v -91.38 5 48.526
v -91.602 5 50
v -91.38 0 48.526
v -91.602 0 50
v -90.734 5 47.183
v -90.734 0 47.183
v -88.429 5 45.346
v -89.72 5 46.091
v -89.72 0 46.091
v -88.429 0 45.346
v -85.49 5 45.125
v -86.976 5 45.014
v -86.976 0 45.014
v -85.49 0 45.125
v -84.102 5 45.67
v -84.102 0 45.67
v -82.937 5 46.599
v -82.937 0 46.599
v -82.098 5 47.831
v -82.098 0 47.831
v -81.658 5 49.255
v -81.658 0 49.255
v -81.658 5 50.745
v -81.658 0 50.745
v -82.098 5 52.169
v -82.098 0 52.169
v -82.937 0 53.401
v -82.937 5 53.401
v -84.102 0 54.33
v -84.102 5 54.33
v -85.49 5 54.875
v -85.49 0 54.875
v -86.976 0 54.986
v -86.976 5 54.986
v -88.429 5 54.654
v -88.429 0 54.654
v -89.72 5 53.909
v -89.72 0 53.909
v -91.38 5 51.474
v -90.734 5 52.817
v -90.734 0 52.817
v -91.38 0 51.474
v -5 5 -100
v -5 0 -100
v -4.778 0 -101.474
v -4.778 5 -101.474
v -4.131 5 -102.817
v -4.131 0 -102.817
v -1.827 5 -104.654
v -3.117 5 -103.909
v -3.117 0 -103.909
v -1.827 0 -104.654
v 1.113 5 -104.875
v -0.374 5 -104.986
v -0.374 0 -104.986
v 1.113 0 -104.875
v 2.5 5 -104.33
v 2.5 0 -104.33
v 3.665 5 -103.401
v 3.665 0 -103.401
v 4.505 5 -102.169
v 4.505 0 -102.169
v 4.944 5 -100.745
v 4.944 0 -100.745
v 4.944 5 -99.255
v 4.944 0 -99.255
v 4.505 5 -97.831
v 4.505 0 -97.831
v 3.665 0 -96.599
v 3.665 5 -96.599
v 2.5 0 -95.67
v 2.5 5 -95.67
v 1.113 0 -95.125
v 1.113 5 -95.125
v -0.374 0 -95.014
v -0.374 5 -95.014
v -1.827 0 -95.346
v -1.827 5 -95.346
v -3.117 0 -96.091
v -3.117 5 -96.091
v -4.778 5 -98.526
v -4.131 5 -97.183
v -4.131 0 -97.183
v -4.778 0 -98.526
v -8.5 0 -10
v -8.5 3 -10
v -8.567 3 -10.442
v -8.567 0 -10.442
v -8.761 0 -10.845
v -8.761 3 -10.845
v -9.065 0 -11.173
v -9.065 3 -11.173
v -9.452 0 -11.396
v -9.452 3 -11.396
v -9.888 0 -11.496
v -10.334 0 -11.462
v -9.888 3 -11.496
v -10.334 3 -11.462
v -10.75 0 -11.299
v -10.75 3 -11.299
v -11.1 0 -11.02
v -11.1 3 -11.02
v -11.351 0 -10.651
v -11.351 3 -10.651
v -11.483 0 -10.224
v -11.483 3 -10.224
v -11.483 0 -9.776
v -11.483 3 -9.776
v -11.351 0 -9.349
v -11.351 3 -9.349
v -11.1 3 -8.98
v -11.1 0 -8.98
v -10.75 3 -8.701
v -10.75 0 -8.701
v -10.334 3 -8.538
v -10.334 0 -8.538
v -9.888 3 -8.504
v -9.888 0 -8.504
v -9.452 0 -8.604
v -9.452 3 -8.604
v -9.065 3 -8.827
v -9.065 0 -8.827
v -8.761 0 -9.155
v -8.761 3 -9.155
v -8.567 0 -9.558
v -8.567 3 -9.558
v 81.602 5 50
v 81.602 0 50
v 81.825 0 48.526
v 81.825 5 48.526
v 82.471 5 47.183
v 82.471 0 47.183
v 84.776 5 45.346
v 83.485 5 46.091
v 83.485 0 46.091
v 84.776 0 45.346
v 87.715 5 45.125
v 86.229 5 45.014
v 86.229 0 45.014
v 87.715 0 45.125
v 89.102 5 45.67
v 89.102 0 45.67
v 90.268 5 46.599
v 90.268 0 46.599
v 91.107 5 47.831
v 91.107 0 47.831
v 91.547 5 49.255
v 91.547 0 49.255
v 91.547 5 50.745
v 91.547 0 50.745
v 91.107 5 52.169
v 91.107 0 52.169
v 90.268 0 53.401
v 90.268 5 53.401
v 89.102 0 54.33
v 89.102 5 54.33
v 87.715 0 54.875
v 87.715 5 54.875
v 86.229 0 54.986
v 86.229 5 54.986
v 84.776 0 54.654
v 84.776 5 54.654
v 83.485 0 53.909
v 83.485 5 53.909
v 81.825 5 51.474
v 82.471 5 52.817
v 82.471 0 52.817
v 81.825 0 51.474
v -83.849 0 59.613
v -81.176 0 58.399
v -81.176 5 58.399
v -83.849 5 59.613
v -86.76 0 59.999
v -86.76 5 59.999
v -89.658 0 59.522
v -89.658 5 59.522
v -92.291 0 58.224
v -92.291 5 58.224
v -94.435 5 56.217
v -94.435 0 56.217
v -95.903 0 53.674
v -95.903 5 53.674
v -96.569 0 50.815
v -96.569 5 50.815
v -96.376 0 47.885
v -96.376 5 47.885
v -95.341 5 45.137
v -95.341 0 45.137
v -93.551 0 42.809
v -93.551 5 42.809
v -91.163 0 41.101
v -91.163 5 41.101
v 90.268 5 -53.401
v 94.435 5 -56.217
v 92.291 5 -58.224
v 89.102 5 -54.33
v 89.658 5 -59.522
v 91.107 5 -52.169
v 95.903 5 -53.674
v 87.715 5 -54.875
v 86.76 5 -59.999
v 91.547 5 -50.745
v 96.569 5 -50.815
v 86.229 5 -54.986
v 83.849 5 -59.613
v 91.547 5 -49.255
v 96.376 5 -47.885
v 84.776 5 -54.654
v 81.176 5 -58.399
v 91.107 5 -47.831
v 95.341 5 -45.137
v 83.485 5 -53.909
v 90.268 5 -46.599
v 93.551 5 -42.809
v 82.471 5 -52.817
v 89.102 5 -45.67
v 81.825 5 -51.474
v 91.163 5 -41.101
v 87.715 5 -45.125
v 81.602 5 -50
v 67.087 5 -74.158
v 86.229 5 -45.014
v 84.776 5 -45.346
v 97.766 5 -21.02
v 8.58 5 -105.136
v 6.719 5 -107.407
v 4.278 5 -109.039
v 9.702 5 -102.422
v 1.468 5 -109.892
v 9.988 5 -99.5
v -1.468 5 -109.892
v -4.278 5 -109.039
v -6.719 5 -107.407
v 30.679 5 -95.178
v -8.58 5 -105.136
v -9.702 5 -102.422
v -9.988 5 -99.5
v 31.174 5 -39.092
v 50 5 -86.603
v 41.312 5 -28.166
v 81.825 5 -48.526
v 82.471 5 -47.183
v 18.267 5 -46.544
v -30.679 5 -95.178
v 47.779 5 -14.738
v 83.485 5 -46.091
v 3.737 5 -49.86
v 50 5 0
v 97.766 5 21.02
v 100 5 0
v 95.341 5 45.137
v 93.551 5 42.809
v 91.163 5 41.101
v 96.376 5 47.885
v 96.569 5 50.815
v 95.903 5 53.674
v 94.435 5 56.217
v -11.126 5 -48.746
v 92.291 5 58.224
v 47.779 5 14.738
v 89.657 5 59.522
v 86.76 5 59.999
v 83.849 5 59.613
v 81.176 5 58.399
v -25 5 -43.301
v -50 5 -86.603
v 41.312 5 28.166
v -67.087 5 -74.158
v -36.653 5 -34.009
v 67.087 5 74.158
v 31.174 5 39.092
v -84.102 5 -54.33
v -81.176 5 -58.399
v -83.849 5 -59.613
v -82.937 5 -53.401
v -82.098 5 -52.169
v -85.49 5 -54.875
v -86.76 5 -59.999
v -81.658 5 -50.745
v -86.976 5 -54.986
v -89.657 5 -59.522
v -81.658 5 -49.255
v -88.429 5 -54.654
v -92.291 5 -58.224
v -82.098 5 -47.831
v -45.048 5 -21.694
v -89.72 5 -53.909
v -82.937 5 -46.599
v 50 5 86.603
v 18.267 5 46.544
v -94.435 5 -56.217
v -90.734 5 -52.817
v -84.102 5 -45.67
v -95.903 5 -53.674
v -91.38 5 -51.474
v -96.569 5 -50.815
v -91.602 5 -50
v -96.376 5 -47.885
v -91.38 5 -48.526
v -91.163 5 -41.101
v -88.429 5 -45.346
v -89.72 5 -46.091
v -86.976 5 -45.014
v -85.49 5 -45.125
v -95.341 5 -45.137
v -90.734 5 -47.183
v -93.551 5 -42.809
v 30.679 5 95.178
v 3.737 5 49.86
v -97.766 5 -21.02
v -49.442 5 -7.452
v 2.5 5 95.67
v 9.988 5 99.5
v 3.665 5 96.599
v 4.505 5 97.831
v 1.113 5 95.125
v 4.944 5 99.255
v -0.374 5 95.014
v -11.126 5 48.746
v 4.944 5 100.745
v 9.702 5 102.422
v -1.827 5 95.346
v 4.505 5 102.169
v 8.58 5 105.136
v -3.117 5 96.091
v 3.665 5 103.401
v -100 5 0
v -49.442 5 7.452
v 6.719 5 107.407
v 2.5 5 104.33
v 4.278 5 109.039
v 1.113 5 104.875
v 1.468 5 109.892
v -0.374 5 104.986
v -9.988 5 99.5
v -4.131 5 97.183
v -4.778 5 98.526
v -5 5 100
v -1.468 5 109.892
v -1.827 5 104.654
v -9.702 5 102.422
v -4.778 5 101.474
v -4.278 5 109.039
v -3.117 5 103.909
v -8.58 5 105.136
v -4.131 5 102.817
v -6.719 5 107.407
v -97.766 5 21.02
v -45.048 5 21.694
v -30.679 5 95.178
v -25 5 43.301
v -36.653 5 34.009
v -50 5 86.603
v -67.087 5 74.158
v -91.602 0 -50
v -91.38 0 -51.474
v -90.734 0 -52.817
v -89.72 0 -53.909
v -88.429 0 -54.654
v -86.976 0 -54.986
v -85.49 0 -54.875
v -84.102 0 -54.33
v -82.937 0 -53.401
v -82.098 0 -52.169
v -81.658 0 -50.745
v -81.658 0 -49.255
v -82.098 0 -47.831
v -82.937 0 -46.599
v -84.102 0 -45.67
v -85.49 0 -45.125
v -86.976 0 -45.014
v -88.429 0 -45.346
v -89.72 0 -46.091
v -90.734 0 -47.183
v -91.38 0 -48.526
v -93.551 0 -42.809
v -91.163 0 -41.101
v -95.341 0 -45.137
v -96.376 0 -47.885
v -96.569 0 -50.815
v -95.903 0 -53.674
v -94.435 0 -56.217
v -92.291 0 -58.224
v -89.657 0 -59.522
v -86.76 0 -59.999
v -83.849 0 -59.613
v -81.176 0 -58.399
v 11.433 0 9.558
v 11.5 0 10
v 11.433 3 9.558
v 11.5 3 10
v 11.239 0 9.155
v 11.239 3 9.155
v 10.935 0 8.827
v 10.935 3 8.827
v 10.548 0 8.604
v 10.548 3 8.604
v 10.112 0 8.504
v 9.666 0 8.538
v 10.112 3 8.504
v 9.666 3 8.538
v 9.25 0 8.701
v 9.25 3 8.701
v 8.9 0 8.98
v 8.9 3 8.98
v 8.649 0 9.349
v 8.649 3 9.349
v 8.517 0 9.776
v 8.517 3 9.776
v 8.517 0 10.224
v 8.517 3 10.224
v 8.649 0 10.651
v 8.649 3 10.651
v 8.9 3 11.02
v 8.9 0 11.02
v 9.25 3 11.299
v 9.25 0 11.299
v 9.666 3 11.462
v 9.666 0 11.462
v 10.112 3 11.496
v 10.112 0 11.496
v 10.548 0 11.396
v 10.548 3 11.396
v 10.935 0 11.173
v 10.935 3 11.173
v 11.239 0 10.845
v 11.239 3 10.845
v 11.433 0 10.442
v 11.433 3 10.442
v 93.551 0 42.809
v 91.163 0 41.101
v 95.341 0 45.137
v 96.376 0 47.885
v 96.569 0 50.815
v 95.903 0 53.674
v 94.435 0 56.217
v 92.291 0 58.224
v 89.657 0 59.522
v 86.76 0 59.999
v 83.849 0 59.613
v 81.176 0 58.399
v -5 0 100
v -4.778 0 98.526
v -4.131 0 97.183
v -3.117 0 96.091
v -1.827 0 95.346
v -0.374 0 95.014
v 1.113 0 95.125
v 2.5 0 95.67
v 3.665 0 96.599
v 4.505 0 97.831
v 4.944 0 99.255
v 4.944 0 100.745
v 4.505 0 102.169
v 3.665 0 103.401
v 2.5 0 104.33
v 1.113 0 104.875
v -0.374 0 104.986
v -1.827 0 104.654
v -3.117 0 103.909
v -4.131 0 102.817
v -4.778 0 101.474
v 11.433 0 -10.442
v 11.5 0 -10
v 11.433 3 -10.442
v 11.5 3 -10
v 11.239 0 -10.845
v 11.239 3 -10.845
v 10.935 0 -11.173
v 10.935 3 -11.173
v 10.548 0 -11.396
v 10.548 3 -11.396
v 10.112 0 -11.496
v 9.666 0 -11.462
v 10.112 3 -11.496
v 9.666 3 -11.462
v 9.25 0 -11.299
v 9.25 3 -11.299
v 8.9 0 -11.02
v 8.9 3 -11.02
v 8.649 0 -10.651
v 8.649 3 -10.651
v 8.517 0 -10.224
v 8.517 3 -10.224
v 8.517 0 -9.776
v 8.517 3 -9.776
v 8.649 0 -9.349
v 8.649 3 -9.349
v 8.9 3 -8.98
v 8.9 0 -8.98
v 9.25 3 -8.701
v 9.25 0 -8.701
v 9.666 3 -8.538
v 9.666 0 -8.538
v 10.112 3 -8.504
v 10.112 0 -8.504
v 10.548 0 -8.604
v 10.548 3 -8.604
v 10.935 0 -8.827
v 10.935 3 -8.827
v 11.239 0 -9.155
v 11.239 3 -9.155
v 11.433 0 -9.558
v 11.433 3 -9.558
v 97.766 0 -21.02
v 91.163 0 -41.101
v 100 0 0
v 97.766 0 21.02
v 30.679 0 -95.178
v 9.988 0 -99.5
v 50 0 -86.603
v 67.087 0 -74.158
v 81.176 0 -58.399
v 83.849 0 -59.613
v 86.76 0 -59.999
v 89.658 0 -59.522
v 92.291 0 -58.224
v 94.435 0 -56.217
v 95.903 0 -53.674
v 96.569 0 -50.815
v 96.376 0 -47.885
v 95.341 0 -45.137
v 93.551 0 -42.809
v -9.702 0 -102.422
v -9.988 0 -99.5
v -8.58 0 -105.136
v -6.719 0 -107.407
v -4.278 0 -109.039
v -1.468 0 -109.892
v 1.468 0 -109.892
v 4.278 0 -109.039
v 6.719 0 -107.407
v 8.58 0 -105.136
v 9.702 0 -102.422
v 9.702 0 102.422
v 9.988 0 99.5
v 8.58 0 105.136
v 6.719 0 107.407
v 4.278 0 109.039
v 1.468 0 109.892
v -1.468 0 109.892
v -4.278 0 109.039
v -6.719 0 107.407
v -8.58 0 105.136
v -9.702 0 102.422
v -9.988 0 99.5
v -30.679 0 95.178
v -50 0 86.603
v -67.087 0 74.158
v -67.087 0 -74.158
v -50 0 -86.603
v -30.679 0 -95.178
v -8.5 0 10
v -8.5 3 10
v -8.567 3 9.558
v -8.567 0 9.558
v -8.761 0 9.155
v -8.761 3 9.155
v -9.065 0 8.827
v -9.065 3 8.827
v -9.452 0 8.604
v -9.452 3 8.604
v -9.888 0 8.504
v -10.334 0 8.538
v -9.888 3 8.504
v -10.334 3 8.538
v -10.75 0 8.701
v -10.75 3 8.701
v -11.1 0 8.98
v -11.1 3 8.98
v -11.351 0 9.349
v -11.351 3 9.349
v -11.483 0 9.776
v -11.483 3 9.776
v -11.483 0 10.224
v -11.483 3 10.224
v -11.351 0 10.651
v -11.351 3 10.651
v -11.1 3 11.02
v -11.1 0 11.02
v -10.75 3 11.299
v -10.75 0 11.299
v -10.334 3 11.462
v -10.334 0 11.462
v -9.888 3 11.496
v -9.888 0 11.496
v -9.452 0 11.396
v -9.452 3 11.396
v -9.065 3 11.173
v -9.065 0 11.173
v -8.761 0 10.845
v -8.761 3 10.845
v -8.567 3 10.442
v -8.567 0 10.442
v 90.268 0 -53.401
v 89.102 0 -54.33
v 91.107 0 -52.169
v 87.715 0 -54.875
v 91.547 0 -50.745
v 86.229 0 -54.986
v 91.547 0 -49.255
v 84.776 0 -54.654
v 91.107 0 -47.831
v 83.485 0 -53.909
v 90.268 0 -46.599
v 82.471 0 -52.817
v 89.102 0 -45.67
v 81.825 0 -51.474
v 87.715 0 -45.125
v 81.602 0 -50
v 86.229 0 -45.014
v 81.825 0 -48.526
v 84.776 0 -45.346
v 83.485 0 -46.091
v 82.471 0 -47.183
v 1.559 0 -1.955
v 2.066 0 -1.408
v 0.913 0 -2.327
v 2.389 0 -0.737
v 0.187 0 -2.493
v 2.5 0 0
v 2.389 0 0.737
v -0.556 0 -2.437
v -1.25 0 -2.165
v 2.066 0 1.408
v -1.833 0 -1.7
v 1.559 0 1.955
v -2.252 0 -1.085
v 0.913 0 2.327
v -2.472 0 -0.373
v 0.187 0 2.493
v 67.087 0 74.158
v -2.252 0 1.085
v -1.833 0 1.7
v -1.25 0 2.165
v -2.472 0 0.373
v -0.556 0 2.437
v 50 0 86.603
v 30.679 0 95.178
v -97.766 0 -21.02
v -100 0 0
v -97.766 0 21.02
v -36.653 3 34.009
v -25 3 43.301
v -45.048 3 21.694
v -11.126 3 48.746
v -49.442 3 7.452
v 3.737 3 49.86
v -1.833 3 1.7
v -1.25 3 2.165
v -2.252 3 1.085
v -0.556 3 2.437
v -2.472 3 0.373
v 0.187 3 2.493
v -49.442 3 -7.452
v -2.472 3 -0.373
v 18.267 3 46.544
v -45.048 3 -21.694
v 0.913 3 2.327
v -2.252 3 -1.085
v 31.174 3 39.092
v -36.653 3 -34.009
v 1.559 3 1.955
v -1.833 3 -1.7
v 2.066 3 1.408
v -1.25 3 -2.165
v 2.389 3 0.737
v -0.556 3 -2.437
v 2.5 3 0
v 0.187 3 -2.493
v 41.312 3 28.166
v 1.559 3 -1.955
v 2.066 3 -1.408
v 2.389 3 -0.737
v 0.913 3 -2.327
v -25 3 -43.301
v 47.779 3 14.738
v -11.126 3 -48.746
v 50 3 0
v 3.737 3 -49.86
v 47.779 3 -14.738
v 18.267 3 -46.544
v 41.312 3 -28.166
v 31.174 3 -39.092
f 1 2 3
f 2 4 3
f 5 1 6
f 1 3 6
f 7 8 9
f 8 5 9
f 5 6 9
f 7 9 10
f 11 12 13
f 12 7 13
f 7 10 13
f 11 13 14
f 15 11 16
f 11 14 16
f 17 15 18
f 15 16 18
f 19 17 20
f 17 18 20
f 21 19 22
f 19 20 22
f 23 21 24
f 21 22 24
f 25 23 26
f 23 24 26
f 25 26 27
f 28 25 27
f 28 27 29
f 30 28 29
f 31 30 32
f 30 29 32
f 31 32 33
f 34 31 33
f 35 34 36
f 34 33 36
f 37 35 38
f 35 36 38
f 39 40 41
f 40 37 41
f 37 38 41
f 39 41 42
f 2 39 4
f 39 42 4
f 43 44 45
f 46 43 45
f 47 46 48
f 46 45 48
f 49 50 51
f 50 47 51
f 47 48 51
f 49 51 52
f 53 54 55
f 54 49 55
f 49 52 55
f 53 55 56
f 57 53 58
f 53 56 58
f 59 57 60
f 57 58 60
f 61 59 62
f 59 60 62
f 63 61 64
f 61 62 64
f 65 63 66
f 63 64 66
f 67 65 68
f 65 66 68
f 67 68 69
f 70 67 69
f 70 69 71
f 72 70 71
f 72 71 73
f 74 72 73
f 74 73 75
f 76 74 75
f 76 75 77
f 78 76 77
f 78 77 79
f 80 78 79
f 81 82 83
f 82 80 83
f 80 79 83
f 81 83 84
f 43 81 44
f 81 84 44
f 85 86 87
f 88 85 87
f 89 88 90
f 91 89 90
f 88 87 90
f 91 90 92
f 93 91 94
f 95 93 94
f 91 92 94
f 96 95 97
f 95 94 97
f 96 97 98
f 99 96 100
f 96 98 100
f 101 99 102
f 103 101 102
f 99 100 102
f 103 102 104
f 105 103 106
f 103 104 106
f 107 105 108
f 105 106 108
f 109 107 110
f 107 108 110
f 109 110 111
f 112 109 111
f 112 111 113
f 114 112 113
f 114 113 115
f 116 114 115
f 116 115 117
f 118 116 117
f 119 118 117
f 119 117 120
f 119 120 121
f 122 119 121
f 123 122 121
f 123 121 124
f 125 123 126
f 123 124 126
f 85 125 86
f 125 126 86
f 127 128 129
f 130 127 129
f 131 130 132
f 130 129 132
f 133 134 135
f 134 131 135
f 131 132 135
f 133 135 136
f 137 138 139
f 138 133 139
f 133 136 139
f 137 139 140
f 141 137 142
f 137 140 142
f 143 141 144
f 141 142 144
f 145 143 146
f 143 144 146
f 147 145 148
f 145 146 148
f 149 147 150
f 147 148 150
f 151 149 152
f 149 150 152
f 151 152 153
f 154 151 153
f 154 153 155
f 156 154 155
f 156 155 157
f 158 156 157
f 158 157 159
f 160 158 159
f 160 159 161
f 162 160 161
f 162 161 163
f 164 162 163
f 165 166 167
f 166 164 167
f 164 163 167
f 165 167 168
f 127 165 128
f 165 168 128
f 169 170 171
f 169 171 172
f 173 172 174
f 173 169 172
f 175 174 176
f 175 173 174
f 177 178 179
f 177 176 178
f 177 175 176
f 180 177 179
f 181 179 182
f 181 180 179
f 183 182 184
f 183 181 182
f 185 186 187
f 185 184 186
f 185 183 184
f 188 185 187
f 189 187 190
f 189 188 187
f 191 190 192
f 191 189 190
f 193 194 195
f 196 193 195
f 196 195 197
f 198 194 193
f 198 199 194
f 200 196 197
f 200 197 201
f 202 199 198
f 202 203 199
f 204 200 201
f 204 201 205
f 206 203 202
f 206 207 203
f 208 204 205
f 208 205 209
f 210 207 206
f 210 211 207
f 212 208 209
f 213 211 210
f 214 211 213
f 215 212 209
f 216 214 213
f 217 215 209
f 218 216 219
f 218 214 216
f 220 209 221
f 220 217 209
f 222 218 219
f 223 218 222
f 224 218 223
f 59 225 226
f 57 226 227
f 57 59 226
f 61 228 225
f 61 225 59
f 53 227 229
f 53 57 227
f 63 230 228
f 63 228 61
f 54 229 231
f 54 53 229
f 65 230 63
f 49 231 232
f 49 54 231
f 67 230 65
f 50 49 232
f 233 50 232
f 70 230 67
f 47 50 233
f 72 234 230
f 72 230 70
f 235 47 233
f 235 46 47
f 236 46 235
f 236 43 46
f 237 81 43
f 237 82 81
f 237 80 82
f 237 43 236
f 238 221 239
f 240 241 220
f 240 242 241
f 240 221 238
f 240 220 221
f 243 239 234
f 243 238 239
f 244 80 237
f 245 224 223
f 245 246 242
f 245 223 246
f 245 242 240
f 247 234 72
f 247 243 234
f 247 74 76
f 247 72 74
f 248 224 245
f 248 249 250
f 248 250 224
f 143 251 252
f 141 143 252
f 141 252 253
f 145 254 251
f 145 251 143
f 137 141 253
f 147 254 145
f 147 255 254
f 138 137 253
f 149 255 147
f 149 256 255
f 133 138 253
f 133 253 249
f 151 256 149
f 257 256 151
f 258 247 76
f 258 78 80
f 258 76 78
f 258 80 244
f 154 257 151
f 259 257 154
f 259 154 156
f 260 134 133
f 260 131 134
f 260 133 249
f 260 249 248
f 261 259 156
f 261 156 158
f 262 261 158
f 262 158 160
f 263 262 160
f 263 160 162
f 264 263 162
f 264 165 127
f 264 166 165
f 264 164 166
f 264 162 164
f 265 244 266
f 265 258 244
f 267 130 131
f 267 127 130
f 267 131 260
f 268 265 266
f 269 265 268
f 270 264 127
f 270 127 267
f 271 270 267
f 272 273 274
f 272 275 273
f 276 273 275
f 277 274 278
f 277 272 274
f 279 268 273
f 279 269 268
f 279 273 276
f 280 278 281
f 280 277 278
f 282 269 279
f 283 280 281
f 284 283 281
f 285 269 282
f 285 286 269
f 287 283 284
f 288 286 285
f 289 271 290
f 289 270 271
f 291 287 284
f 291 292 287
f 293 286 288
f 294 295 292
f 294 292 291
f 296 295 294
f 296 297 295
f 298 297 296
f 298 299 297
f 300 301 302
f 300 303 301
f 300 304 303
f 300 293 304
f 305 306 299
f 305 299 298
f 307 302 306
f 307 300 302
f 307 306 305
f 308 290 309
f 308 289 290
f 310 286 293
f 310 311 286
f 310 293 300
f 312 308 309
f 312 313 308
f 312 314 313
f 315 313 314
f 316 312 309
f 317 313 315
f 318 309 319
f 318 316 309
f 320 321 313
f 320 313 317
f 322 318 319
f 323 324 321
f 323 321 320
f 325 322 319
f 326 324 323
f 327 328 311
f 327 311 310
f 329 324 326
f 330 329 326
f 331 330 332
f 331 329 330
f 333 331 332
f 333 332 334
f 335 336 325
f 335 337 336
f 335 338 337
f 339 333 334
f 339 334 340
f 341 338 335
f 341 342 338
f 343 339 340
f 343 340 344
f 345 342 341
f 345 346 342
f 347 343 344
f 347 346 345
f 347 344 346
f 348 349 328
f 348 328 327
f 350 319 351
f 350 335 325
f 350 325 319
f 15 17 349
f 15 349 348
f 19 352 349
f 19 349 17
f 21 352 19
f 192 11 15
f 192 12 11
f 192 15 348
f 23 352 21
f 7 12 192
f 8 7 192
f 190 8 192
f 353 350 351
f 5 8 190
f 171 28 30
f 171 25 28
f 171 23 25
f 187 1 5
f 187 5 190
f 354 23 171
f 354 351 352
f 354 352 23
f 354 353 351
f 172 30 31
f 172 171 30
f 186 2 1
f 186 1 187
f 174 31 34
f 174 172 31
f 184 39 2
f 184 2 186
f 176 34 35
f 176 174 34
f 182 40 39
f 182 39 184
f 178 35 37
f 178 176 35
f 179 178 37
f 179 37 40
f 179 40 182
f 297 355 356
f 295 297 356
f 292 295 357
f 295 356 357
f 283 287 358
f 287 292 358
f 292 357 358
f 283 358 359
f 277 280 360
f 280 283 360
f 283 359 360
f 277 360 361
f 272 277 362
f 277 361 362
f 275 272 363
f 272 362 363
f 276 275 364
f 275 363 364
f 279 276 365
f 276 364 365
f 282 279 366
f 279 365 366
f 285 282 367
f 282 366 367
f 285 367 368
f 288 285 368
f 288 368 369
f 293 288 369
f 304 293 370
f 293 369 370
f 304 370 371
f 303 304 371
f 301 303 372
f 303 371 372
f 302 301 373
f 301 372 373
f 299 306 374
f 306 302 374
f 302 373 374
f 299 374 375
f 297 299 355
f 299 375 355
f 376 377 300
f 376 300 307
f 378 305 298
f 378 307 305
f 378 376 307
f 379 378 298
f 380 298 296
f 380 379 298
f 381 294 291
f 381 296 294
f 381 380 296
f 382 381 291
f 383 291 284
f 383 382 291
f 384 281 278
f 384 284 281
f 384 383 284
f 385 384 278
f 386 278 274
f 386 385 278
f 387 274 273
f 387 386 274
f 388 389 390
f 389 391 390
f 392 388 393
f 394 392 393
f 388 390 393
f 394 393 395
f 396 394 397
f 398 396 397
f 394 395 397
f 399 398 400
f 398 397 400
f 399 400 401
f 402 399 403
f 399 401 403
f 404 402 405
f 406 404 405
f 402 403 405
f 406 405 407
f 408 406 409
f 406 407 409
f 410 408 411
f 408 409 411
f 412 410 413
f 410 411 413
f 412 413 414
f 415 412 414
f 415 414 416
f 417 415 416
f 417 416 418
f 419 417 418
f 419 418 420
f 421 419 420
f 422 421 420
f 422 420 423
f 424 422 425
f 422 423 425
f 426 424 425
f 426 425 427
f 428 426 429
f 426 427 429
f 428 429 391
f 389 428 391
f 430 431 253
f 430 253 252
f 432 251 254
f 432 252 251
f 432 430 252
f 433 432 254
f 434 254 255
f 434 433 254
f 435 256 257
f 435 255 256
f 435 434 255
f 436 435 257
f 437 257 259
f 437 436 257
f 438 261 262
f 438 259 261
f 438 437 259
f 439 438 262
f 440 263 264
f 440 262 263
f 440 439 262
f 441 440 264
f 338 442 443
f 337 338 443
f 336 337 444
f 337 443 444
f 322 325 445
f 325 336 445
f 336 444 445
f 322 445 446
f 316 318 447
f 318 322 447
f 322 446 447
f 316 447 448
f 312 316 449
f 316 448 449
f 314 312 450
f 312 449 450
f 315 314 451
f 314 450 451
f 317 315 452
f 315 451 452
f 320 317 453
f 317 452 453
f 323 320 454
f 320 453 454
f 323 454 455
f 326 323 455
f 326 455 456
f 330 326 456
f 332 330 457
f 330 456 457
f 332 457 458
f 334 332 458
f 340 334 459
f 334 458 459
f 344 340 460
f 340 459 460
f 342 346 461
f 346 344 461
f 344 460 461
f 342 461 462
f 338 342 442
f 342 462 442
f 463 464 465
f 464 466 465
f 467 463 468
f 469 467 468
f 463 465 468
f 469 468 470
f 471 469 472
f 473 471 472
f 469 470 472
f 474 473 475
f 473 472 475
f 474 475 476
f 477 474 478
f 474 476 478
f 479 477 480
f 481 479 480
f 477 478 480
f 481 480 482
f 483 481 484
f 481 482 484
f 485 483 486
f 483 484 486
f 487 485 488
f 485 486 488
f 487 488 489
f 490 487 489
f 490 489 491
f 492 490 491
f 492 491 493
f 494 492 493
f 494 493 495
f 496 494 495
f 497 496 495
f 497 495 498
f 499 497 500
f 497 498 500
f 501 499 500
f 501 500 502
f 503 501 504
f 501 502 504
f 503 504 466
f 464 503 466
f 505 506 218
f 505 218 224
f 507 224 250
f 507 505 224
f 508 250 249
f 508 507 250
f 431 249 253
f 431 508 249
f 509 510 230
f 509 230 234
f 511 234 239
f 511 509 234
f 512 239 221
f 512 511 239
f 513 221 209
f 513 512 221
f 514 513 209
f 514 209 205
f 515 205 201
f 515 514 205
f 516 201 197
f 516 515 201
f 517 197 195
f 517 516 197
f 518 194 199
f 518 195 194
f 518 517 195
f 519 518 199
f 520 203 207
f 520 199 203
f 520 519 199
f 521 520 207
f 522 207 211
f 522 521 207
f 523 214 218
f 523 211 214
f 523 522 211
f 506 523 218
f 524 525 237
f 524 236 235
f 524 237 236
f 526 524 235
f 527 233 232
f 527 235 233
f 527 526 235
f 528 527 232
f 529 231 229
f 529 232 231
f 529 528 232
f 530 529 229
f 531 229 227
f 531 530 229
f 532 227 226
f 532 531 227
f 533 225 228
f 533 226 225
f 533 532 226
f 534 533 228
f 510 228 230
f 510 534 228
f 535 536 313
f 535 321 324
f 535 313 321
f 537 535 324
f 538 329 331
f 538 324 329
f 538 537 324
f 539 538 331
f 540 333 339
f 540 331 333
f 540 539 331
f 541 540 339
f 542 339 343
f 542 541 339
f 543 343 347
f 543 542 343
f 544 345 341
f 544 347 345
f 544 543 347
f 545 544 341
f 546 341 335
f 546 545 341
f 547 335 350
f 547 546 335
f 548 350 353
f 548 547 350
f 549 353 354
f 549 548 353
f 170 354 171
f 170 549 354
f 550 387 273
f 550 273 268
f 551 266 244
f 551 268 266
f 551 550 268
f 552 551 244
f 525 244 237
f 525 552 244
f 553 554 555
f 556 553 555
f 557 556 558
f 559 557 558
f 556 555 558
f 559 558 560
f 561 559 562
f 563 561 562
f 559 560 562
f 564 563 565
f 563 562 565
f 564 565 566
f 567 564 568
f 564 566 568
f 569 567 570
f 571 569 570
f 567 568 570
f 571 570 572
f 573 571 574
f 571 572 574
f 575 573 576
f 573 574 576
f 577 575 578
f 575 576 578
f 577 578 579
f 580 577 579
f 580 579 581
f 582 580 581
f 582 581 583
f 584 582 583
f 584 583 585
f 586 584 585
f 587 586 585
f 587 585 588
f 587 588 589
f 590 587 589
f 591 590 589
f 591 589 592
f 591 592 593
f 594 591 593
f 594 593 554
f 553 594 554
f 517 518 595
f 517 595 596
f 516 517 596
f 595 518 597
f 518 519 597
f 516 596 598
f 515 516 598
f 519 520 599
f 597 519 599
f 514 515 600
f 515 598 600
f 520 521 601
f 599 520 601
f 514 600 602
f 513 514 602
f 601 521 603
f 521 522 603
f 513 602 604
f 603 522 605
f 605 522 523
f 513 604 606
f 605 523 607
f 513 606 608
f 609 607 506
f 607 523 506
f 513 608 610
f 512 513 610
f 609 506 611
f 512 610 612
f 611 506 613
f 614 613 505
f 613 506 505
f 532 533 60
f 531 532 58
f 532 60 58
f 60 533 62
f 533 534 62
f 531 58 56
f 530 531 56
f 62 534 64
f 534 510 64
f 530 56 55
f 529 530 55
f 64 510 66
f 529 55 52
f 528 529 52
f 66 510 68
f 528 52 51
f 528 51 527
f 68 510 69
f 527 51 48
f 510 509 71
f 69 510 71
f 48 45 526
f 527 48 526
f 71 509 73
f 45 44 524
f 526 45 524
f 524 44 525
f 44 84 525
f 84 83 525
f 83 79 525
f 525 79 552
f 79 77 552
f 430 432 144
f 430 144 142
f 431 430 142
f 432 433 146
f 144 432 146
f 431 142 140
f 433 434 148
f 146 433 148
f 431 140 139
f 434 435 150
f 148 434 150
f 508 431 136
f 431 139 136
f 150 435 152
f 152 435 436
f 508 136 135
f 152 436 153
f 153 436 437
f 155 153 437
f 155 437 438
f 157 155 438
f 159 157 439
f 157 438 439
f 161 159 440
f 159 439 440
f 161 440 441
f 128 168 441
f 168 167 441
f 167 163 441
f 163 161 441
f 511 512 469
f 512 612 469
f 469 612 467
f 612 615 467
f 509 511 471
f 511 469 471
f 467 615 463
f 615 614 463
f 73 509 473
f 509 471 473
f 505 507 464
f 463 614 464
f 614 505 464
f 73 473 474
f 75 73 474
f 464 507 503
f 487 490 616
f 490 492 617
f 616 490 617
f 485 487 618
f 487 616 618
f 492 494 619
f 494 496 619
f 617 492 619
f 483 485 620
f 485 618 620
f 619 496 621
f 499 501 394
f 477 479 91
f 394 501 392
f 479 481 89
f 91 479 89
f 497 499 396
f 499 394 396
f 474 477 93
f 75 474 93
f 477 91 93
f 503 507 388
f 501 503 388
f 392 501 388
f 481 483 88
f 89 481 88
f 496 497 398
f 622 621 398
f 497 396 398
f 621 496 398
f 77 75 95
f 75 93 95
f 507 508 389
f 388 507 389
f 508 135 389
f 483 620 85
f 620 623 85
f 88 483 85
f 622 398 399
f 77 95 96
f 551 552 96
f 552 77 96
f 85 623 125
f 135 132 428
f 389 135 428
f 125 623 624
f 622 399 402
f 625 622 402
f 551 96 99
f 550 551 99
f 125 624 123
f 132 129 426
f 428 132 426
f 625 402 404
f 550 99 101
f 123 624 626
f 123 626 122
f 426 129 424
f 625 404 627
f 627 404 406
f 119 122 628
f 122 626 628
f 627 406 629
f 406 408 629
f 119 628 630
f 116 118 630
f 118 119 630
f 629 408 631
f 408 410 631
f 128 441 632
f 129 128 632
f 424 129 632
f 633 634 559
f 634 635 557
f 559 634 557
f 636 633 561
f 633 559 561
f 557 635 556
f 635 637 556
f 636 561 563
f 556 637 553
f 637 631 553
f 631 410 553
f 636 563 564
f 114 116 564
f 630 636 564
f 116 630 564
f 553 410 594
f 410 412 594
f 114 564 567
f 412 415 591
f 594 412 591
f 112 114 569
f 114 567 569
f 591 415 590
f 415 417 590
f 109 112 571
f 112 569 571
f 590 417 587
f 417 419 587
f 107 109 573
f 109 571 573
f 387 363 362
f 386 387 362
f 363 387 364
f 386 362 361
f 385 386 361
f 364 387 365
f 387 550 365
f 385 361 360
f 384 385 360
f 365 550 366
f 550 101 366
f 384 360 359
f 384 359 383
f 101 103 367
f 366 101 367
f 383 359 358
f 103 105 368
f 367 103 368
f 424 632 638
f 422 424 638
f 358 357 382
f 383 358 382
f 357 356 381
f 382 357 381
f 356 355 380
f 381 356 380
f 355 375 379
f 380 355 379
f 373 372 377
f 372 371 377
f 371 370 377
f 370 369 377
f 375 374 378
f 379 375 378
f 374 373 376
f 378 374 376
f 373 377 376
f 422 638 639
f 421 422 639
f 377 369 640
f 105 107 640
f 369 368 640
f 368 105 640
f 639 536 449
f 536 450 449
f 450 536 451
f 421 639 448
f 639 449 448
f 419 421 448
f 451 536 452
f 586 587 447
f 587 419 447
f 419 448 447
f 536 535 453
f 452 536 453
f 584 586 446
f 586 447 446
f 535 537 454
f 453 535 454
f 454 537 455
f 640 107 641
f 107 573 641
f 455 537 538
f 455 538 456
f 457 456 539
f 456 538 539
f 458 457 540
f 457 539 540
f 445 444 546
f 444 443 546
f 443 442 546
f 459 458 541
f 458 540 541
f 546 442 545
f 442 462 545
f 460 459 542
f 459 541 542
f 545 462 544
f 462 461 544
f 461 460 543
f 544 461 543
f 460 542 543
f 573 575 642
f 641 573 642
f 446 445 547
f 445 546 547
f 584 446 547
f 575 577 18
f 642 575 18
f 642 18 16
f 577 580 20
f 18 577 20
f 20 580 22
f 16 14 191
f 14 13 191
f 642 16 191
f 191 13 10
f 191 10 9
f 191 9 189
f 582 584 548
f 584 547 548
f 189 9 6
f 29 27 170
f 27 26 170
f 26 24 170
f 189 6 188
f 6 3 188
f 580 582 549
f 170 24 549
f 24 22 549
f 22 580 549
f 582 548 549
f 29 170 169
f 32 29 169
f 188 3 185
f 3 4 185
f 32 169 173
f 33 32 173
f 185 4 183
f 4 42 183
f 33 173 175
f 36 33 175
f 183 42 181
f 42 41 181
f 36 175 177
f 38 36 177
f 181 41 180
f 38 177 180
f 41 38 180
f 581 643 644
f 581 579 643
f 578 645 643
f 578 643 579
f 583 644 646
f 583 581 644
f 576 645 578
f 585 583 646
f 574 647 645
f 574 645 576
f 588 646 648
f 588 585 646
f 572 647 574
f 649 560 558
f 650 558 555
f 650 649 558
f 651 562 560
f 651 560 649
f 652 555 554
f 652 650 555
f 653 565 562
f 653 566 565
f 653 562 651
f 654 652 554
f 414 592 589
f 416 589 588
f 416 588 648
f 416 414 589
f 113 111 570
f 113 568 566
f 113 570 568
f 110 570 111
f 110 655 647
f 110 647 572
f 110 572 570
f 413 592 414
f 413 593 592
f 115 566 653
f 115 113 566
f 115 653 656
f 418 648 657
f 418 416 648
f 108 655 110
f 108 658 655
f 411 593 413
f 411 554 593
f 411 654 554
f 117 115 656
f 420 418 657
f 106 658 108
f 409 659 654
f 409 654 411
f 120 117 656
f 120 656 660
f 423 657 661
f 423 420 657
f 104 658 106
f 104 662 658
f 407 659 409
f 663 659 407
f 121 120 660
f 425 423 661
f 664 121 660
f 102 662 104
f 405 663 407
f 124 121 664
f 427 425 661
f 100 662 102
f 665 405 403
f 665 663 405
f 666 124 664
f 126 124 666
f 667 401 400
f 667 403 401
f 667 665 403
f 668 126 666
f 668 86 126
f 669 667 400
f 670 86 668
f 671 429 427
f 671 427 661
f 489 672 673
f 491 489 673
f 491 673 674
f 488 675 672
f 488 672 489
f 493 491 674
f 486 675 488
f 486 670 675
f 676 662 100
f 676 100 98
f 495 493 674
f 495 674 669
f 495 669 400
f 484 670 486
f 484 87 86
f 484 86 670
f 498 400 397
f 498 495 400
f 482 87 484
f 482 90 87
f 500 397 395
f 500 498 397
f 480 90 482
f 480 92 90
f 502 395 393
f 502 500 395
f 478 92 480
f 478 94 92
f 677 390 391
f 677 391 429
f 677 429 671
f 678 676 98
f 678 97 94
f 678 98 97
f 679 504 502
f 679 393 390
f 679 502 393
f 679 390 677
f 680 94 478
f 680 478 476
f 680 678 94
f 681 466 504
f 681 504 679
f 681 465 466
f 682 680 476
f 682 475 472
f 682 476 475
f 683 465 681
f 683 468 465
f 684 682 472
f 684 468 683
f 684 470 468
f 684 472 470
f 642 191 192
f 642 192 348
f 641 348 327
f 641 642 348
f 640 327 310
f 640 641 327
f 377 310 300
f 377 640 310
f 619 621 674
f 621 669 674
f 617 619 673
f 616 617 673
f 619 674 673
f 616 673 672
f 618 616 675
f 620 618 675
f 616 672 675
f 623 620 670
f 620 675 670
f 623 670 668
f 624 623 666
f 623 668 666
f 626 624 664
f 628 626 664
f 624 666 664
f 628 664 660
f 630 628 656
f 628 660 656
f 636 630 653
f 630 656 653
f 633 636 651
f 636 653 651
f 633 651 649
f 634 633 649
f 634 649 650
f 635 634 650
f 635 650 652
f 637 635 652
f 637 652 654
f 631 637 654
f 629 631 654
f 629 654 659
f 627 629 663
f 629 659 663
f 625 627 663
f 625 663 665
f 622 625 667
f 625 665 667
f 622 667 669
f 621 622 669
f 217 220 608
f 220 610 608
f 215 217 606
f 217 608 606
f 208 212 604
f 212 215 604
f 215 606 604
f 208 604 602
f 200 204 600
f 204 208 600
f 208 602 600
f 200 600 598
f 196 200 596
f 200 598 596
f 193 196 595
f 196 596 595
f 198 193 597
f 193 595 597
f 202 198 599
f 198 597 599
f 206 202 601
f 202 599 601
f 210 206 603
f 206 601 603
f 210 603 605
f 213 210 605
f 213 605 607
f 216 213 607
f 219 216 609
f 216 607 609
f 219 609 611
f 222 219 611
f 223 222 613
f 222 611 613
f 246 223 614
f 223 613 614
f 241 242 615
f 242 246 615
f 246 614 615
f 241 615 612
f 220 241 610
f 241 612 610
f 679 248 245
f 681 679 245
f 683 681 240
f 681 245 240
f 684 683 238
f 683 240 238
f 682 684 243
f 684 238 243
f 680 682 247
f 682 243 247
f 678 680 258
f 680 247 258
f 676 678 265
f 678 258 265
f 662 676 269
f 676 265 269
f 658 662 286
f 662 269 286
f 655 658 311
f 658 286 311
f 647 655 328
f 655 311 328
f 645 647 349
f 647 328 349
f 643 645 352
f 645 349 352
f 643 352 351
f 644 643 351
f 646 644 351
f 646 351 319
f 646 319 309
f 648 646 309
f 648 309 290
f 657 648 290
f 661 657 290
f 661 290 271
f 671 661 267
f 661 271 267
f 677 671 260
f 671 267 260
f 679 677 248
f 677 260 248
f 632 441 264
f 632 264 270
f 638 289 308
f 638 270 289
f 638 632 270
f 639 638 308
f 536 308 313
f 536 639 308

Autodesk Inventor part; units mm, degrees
ref_plane "YZ Plane" through (0, 0, 0) normal (1, 0, 0) x (0, 1, 0)
ref_plane "XZ Plane" through (0, 0, 0) normal (0, 1, 0) x (-1, 0, 0)
ref_plane "XY Plane" through (0, 0, 0) normal (0, 0, 1) x (1, 0, 0)
sketch "Sketch1" plane through (0, 0, 0) normal (0, 1, 0) x (-1, 0, 0)
  arc A0 (9.9875, 99.5) -> (-9.9875, 99.5) centre (0, 100) ccw
  arc A1 (91.1633, 41.1006) -> (81.1758, 58.3994) centre (86.6025, 50) ccw
  arc A2 (81.1758, -58.3994) -> (91.1633, -41.1006) centre (86.6025, -50) ccw
  arc A3 (-9.9875, -99.5) -> (9.9875, -99.5) centre (0, -100) ccw
  arc A4 (-91.1633, -41.1006) -> (-81.1758, -58.3994) centre (-86.6025, -50) ccw
  arc A5 (-81.1758, 58.3994) -> (-91.1633, 41.1006) centre (-86.6025, 50) ccw
  arc A6 (81.1758, 58.3994) -> (9.9875, 99.5) centre (0, 0) ccw
  arc A7 (91.1633, -41.1006) -> (91.1633, 41.1006) centre (0, 0) ccw
  arc A8 (9.9875, -99.5) -> (81.1758, -58.3994) centre (0, 0) ccw
  arc A9 (-81.1758, -58.3994) -> (-9.9875, -99.5) centre (0, 0) ccw
  arc A10 (-9.9875, 99.5) -> (-81.1758, 58.3994) centre (0, 0) ccw
  arc A11 (-91.1633, 41.1006) -> (-91.1633, -41.1006) centre (0, 0) ccw
  circle A12 centre (0, 100) radius 5
  circle A13 centre (86.6025, 50) radius 5
  circle A14 centre (86.6025, -50) radius 5
  circle A15 centre (0, -100) radius 5
  circle A16 centre (-86.6025, -50) radius 5
  circle A17 centre (-86.6025, 50) radius 5
  dimension "d3" = 20
  dimension "d4" = 20
  dimension "d5" = 20
  dimension "d6" = 20
  dimension "d7" = 20
  dimension "d8" = 20
  dimension "d9" = 10
  dimension "d10" = 10
  dimension "d11" = 10
  dimension "d12" = 10
  dimension "d13" = 10
  dimension "d14" = 10
extrude "Extrusion1" add sketch "Sketch1" along normal blind 5
sketch "Sketch2" plane through (0, 5, 0) normal (0, 1, 0) x (1, 0, 0)
  circle A0 centre (0, 0) radius 50
  dimension "d17" = 100
extrude "Extrusion2" cut sketch "Sketch2" against normal blind 2
sketch "Sketch3" plane through (0, 3, 0) normal (0, 1, 0) x (1, 0, 0)
  circle A0 centre (0, 0) radius 2.5
  circle A1 centre (-10, -10) radius 1.5
  circle A2 centre (-10, 10) radius 1.5
  circle A3 centre (10, 10) radius 1.5
  circle A4 centre (10, -10) radius 1.5
  dimension "d20" = 5
  dimension "d29" = 3
  dimension "d30" = 3
  dimension "d31" = 3
  dimension "d32" = 3
extrude "Extrusion3" cut sketch "Sketch3" against normal blind 5
properties part number "Base"
